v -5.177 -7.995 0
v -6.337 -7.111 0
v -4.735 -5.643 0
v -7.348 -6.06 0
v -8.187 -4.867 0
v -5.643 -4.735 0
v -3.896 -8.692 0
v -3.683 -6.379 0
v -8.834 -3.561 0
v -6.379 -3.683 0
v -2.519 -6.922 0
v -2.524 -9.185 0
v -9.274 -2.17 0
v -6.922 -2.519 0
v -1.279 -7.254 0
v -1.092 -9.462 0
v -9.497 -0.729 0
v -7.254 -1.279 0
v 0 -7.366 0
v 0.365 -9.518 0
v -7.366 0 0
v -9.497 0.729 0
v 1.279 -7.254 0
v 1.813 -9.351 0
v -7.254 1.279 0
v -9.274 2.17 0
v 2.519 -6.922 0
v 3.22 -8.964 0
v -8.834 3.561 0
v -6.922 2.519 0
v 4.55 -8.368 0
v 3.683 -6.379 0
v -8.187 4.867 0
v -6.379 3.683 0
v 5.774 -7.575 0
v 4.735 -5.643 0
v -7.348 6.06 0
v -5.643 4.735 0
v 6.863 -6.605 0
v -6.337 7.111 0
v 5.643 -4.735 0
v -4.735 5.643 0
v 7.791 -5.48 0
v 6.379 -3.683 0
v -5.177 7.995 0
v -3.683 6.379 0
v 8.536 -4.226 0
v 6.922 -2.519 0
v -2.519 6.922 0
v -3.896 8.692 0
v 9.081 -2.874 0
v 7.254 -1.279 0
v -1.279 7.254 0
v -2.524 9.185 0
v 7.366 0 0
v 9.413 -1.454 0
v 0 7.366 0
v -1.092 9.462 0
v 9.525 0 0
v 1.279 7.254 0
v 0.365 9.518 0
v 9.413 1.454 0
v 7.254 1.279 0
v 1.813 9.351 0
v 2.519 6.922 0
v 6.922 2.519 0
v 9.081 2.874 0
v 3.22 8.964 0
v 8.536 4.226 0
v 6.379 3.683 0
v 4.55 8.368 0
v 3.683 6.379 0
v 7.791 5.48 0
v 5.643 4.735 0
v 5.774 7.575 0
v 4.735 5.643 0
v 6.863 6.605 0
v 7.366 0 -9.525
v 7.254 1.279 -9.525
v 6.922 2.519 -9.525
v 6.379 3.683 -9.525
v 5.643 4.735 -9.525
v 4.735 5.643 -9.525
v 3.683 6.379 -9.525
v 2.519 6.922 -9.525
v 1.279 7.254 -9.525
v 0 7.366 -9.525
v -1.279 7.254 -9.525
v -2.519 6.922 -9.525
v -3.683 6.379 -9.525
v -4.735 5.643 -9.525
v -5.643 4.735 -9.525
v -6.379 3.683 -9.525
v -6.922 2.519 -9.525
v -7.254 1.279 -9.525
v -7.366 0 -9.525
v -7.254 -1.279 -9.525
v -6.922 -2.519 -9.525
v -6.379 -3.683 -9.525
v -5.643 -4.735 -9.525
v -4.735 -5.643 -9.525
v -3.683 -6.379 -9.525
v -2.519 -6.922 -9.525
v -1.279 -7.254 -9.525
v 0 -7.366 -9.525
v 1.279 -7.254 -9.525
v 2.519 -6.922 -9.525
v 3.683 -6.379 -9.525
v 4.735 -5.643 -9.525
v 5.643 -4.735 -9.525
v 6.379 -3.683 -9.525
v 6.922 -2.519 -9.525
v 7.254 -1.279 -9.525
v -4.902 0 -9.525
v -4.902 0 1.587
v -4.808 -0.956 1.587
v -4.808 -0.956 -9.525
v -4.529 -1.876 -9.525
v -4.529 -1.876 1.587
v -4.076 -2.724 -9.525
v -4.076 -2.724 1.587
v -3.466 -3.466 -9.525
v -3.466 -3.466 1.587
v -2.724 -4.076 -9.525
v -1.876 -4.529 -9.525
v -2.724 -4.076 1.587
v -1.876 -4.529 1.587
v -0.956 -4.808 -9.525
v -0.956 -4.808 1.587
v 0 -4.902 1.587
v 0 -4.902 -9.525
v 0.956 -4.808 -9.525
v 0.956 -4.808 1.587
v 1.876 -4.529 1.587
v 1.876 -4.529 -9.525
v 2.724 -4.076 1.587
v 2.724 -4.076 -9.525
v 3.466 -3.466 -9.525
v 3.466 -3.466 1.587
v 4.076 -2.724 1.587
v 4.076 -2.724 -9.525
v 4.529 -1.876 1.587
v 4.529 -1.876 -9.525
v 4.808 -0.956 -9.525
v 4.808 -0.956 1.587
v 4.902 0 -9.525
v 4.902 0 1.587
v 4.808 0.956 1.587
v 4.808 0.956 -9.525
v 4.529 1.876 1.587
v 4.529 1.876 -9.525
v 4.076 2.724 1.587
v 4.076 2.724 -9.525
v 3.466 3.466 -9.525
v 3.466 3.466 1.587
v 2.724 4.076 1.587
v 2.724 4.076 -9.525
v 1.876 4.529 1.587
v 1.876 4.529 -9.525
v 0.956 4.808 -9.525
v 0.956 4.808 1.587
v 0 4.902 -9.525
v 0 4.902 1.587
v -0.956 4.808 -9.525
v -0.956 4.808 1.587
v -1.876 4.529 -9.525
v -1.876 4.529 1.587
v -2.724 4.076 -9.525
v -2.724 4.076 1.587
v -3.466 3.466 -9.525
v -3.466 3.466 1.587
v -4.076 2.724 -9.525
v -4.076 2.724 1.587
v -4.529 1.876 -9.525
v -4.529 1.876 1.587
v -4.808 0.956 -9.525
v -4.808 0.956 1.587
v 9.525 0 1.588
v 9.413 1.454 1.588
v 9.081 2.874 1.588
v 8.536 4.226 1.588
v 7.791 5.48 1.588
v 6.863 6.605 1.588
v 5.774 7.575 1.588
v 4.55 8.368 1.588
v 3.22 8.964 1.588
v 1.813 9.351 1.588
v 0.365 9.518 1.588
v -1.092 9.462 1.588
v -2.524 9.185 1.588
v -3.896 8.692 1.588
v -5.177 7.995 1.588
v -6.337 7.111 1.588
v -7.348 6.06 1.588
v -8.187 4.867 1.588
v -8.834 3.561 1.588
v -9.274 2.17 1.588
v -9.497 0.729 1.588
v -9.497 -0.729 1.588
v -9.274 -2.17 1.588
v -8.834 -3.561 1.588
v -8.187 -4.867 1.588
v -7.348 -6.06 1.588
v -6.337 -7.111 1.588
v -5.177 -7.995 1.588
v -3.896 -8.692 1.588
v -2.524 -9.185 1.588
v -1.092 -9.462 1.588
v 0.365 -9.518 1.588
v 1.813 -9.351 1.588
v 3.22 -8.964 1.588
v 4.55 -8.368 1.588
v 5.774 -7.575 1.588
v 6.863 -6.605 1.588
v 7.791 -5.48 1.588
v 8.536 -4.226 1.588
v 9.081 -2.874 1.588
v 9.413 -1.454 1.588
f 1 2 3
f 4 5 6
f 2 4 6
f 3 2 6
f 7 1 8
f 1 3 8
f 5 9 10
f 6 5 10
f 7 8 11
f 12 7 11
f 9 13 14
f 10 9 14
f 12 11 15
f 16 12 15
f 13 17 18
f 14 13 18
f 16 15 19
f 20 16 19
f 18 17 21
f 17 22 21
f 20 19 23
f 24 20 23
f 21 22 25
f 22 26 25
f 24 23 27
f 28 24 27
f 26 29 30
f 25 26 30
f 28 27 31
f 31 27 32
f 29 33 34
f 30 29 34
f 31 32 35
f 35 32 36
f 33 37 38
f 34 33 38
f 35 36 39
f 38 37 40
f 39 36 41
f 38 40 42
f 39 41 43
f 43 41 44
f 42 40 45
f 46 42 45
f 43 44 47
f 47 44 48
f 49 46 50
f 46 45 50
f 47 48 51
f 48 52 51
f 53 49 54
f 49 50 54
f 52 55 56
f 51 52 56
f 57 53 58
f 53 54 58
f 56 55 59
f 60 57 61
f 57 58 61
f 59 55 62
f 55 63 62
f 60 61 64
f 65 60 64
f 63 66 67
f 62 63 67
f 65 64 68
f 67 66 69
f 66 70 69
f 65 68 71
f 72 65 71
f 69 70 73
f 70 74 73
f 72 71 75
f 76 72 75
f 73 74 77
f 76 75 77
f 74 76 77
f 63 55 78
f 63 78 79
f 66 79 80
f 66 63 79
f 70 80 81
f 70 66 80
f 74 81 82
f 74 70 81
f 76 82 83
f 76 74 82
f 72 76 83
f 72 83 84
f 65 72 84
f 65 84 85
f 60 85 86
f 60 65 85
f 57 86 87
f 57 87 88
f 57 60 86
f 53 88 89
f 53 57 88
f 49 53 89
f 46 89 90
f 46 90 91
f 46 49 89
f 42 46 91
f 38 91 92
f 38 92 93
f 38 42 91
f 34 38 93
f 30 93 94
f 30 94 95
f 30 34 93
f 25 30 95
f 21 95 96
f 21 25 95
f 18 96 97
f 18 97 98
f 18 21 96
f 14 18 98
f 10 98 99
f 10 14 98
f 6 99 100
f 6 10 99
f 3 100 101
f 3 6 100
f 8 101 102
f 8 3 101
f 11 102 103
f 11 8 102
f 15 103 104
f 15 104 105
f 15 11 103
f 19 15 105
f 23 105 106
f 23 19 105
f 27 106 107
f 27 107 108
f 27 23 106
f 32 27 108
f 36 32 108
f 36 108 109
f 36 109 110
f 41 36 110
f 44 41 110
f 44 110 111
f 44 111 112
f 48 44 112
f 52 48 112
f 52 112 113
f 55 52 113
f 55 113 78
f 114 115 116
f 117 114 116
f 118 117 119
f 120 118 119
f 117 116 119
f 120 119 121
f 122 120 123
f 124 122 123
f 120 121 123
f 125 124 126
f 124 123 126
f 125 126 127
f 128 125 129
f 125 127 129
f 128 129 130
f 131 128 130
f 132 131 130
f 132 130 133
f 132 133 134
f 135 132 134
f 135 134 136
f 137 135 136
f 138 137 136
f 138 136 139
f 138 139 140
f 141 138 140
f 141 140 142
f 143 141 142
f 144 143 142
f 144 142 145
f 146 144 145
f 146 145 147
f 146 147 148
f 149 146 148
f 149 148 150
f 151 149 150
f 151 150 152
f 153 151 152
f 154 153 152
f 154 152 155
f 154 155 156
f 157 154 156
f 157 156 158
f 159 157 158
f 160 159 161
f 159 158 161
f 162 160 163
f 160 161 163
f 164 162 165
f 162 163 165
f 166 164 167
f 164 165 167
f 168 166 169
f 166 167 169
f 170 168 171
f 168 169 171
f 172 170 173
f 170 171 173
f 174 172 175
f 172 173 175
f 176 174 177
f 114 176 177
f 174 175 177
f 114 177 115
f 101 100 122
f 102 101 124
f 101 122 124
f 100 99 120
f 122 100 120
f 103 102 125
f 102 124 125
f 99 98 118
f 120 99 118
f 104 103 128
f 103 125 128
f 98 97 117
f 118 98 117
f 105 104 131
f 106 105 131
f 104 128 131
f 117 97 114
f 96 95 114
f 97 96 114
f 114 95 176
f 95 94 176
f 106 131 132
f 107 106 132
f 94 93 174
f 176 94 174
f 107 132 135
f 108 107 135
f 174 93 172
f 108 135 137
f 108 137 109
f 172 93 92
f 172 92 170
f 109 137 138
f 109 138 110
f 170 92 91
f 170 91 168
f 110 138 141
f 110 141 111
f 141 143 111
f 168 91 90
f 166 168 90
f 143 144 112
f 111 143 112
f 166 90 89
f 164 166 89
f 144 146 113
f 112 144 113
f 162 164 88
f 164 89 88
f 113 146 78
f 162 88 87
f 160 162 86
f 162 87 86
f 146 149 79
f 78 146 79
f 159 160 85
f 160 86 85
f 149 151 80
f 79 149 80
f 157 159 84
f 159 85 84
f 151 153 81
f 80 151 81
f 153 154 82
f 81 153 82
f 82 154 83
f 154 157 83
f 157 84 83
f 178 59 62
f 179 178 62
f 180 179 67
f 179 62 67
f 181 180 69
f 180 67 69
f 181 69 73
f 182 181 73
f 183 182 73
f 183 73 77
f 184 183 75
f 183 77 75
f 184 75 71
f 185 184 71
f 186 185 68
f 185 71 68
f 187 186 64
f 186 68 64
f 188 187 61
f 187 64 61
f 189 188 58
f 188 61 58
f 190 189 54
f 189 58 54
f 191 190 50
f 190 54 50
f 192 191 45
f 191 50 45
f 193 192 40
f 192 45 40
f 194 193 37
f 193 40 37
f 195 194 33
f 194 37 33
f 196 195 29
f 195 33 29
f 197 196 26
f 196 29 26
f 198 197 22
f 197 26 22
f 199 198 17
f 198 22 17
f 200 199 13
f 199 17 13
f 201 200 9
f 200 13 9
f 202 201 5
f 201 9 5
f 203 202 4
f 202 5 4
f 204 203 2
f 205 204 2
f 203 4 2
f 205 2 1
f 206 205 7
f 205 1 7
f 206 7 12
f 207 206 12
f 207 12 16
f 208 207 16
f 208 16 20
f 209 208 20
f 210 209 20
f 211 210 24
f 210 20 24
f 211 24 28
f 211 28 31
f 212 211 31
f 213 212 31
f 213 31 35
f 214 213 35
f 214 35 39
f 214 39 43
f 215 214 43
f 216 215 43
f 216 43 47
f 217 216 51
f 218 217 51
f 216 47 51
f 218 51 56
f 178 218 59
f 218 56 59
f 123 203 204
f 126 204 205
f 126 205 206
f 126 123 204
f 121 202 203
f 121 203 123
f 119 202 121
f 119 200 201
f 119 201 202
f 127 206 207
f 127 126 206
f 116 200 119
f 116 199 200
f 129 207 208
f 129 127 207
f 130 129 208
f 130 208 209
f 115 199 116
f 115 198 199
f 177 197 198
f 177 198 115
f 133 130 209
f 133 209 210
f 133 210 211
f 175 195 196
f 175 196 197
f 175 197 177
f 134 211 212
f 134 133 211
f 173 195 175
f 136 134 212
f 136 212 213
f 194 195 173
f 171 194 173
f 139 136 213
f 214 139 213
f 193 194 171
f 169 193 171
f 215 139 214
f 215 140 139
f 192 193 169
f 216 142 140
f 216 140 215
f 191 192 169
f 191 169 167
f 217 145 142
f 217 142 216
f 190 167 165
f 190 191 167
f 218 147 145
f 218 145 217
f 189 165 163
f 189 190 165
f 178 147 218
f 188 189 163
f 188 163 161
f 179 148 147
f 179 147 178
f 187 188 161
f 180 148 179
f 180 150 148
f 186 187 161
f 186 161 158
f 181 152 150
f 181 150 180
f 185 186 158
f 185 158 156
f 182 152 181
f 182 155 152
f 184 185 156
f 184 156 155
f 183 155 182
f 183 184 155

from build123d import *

# Parameters (mm, degrees)
F2_R     = 7.366
F3_DEPTH = 9.525
F4_R     = 9.525
F5_DEPTH = 1.5875
F8_D     = 9.8044


# Not quite as in the source:
# - a feature of the source that left no trace in its solid (it failed there, or was rolled back) is left out


with BuildPart() as f3:
    # F2 (on Top) → F3 (new body, through all)
    with BuildSketch(Plane.XY):
        Circle(F2_R)
    extrude(amount=-F3_DEPTH)

    # F4 (on Top) → F5 (join, through all)
    with BuildSketch(Plane.XY):
        Circle(F4_R)
    extrude(amount=F5_DEPTH)

    # F8 (through all)
    with Locations(Plane(origin=(0, 0, -9.525), x_dir=(1, 0, 0), z_dir=(0, 0, -1))):
        with Locations((0, 0)):
            Hole(F8_D / 2)


solid = f3.part
